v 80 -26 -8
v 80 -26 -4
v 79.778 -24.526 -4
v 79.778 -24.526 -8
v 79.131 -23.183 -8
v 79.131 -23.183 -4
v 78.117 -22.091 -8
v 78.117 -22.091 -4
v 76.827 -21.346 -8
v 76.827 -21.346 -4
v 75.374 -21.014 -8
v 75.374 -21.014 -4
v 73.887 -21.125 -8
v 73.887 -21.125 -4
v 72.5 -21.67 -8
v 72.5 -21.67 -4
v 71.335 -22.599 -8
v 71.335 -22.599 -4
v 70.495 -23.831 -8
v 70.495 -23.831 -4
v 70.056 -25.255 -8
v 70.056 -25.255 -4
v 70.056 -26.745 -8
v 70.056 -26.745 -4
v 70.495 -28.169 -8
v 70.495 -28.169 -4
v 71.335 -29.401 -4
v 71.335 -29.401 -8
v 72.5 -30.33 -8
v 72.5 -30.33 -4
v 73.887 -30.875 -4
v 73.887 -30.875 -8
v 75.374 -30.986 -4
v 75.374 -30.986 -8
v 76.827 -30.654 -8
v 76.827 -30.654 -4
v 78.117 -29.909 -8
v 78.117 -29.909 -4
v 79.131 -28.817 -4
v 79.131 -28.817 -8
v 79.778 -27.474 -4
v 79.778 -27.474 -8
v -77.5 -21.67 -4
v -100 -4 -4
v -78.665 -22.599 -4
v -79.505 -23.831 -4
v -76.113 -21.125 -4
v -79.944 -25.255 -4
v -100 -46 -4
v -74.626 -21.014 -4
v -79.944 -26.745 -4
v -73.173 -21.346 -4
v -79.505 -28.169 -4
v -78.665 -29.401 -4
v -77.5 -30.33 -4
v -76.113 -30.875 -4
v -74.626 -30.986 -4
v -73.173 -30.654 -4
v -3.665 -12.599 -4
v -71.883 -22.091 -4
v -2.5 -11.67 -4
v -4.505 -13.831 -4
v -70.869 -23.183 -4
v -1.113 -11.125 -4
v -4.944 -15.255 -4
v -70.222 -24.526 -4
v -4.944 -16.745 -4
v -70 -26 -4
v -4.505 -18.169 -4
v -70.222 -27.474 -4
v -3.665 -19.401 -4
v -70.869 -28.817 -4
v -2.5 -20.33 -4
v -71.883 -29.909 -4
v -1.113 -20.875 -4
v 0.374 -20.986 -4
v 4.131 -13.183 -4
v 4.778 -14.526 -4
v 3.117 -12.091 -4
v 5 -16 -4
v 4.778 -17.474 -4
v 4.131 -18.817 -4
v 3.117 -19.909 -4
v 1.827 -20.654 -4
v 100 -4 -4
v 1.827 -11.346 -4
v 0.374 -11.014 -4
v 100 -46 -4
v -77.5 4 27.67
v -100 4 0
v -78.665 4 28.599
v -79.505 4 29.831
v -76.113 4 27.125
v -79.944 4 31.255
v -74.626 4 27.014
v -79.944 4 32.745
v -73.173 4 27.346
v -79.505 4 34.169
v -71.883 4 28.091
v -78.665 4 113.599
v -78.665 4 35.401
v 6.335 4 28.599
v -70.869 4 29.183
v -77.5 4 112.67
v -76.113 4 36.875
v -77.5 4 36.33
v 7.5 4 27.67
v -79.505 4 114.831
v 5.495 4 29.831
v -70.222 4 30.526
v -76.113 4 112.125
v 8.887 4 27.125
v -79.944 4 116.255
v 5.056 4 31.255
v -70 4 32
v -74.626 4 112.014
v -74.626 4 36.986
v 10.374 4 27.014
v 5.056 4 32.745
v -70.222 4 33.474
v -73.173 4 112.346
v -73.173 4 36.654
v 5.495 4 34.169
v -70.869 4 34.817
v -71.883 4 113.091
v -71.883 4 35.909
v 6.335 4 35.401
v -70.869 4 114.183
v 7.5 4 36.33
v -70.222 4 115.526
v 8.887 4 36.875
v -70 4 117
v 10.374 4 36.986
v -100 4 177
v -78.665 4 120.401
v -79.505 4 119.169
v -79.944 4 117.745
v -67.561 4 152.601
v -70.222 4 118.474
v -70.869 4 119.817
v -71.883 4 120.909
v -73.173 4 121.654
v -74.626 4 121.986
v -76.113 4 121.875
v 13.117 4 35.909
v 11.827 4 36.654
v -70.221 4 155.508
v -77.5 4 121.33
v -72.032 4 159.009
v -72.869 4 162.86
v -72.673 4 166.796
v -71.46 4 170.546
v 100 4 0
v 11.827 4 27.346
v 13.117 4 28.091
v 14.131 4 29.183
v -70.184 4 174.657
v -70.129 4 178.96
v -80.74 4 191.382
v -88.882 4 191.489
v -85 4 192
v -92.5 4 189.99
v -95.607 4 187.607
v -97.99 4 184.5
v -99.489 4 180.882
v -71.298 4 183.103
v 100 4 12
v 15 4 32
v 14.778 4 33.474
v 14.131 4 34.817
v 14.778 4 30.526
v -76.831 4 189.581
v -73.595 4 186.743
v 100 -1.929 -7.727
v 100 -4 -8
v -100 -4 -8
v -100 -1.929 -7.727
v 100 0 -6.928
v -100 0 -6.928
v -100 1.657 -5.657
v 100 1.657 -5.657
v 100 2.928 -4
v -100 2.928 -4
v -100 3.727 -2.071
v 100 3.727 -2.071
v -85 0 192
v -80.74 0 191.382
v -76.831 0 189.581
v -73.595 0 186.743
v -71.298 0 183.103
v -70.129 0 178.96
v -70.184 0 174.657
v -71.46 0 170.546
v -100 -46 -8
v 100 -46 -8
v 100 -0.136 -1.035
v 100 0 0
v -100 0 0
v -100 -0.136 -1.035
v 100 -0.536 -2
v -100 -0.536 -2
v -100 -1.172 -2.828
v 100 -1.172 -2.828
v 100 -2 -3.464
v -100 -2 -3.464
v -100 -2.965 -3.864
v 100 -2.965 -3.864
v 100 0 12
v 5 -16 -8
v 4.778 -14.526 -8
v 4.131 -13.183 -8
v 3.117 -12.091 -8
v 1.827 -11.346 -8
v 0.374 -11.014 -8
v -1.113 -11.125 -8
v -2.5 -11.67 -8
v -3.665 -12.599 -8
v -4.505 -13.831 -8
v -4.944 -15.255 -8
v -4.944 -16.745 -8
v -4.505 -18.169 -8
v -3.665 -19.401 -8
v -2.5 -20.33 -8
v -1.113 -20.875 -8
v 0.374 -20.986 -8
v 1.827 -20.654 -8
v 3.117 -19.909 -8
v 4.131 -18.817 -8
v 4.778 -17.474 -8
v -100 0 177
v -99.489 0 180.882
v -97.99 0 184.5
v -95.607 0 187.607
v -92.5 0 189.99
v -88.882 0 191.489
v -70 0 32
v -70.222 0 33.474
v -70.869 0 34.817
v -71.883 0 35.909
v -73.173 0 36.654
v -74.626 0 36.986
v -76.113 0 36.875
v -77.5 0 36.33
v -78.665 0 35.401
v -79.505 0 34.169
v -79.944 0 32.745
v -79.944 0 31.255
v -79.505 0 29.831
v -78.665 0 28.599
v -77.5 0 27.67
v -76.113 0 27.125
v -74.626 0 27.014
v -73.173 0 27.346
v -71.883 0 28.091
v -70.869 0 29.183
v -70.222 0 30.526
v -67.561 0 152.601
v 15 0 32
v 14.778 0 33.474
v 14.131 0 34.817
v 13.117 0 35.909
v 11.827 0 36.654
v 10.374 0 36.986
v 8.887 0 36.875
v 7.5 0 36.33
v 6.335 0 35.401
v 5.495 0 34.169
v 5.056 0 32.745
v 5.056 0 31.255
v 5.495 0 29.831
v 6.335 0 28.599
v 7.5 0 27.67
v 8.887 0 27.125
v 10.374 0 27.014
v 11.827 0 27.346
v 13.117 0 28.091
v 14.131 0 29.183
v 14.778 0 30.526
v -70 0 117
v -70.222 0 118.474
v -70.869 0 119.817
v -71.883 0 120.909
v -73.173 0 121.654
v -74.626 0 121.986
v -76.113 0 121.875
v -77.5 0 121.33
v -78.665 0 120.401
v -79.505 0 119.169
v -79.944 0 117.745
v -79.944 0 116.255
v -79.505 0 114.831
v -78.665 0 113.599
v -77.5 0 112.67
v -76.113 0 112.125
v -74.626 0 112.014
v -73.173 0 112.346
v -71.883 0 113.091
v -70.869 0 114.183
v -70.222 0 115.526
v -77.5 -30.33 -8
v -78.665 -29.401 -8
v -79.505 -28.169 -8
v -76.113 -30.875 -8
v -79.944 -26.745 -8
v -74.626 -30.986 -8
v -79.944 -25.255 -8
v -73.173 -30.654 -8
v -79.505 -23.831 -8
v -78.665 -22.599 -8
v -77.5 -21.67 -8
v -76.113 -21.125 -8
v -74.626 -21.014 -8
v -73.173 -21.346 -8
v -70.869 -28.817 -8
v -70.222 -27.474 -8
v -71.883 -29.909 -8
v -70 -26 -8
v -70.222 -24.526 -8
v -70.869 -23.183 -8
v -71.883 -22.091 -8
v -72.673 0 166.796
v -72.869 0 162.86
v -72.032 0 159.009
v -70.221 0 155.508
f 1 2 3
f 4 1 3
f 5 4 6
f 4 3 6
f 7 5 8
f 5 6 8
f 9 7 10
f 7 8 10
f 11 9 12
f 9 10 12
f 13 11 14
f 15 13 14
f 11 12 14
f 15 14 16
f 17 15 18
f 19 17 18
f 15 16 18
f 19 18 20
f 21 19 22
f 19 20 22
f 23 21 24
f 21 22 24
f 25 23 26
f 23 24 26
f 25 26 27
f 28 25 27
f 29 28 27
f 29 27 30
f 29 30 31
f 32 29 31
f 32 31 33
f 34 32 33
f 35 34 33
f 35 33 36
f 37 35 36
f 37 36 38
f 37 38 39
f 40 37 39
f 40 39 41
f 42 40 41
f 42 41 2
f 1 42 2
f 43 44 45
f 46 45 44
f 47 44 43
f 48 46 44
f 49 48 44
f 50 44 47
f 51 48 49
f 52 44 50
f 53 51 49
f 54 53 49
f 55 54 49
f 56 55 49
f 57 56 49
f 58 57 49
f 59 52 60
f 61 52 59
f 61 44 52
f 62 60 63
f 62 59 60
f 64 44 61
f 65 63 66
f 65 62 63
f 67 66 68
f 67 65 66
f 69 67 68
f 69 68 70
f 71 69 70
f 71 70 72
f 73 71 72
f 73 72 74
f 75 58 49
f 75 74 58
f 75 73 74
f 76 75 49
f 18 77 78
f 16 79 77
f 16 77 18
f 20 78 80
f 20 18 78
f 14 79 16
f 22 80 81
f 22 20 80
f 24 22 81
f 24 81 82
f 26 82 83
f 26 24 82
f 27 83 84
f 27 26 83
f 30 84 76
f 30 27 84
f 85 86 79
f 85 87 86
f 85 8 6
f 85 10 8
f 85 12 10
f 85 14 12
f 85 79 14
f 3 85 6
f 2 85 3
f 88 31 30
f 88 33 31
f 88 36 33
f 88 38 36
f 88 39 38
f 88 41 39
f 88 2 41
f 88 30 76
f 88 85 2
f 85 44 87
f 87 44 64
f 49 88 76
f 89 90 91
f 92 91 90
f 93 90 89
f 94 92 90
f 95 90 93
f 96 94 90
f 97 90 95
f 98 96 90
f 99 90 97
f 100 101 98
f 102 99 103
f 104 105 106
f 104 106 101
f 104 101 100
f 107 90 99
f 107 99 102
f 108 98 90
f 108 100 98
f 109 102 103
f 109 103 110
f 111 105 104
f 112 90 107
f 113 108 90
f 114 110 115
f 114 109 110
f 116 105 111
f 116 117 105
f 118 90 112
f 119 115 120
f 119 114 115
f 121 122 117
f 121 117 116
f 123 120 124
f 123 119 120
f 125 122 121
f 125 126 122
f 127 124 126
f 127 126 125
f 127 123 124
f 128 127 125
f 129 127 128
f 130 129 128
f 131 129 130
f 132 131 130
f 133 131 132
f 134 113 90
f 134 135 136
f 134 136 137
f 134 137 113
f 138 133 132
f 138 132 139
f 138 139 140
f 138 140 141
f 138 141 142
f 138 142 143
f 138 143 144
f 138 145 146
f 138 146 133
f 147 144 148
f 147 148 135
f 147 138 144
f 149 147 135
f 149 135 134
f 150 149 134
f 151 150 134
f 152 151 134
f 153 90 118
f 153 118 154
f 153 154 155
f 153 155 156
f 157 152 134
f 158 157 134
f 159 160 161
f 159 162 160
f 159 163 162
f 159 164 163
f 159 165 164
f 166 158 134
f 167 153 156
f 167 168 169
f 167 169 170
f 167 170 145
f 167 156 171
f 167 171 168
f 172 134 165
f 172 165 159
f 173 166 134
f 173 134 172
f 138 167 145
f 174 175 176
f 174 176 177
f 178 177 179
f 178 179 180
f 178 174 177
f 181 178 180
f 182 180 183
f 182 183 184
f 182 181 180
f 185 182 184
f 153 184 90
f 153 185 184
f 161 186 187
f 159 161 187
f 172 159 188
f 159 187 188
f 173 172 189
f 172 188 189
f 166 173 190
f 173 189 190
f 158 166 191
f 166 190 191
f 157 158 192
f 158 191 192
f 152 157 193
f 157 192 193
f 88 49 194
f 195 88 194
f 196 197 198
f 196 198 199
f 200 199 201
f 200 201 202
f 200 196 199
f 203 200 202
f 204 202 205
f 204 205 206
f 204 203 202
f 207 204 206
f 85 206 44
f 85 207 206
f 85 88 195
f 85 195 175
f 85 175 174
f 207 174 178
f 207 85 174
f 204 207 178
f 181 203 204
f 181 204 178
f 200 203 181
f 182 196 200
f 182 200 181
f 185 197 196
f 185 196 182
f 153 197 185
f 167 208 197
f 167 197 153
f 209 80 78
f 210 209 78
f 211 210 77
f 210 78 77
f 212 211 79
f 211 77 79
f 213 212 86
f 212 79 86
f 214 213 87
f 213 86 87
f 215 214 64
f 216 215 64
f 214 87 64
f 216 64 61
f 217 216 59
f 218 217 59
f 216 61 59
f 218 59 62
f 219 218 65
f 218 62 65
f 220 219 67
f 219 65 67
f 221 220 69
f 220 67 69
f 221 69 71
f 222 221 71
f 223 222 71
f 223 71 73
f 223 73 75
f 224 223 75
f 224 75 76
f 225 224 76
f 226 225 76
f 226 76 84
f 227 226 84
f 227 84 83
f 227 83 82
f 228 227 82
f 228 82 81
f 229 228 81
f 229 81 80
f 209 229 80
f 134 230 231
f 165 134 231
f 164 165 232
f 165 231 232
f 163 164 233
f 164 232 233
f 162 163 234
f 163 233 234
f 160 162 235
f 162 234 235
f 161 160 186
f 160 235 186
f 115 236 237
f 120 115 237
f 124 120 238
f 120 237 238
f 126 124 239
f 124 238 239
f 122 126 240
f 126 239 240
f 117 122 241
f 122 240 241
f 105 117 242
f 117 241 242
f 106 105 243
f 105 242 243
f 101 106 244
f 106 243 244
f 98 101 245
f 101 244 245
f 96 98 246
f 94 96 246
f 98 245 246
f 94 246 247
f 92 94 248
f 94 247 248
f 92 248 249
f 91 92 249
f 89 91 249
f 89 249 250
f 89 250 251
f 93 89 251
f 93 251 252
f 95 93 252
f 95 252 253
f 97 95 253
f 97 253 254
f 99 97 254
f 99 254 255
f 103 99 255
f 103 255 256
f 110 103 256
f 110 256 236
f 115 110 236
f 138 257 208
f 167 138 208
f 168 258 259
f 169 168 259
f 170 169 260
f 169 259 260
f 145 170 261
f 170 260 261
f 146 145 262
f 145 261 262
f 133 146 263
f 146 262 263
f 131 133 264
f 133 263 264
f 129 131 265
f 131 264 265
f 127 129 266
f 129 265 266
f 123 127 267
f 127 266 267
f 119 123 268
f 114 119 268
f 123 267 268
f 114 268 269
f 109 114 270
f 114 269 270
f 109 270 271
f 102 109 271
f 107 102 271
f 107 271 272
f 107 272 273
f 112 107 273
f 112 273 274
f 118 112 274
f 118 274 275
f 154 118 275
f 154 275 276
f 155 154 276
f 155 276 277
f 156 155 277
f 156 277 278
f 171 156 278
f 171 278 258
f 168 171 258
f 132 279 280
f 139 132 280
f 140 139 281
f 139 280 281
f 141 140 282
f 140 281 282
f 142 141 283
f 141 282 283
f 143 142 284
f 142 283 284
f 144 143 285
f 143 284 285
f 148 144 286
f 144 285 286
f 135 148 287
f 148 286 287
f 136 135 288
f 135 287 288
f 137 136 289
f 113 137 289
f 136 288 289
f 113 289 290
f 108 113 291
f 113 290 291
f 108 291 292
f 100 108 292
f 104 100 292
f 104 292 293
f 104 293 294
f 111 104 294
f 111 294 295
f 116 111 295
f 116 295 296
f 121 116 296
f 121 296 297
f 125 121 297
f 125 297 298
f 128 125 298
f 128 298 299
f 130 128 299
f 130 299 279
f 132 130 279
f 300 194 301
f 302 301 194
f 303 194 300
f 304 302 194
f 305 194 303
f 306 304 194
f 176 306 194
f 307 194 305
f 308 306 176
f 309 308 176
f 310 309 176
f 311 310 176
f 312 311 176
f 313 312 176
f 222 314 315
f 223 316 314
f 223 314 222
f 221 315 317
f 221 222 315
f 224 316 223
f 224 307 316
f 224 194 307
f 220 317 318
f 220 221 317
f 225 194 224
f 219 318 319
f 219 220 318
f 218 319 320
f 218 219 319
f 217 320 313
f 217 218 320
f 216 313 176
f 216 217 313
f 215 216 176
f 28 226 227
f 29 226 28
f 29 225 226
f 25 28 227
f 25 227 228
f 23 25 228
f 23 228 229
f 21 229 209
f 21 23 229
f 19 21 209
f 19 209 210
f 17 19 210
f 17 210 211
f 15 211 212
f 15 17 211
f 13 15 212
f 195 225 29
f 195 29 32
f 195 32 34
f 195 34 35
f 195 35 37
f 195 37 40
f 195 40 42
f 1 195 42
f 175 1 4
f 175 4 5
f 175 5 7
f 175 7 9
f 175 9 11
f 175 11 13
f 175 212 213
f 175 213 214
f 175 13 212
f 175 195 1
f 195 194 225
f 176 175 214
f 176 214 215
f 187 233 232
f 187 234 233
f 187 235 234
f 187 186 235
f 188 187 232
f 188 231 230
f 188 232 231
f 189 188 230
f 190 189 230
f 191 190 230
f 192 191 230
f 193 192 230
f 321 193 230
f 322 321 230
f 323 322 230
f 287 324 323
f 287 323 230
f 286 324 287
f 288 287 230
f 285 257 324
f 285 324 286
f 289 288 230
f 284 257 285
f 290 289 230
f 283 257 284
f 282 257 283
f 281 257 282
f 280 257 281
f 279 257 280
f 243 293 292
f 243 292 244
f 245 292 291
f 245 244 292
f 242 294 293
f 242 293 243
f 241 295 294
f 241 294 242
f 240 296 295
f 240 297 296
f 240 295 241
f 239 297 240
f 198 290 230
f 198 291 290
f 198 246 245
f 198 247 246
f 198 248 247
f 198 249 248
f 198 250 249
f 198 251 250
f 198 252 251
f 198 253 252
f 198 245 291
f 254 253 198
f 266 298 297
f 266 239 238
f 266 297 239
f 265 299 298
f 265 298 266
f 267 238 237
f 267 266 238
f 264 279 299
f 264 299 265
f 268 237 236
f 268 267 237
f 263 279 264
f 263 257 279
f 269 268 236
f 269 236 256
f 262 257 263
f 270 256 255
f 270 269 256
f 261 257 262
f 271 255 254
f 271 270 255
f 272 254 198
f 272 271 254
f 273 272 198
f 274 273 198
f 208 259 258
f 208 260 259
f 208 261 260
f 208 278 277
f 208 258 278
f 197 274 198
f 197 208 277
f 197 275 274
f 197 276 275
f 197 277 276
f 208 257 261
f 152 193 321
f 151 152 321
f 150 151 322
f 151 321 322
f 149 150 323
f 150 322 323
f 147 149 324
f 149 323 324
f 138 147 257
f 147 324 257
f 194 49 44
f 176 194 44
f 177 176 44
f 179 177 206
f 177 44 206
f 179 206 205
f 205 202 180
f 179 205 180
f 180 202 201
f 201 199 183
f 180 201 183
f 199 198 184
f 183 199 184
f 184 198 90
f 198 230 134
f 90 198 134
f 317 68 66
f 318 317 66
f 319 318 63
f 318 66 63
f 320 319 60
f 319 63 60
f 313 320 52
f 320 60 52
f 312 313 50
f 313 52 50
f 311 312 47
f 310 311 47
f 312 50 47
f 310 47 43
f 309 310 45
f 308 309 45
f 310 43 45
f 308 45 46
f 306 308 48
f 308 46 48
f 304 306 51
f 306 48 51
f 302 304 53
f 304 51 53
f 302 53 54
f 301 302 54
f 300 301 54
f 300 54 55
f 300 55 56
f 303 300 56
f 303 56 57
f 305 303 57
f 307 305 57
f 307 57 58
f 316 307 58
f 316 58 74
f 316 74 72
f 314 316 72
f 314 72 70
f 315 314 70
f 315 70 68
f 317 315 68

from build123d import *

# Parameters (mm, degrees)
F1_DEPTH = 100
F3_DEPTH = 4.001
F4_R     = 5
F5_DEPTH = 4.001
F6_R     = 5
F7_DEPTH = 4.001


# Not quite as in the source:
# - a feature names something its author has since deleted; it is built from what else it names


with BuildPart() as f1:
    # F0 (on Right) → F1 (new body, symmetric)
    with BuildSketch(Plane.YZ):
        with BuildLine():
            Line((0, 192), (0, 0))
            ThreePointArc((0, 0), (-1.1715728753, -2.8284271247), (-4, -4))
            Line((-4, -4), (-46, -4))
            Line((-46, -4), (-46, -8))
            Line((-46, -8), (-4, -8))
            ThreePointArc((-4, -8), (1.6568542495, -5.6568542495), (4, 0))
            Line((4, 0), (4, 192))
            Line((4, 192), (0, 192))
        make_face()
    extrude(amount=F1_DEPTH, both=True)

    # F2 (on face) → F3 (cut, through all)
    with BuildSketch(Plane.XZ):
        with BuildLine():
            Line((-67.5611548883, 152.6005032665), (100, 12))
            Line((100, 12), (100, 192))
            Line((100, 192), (-85, 192))
            ThreePointArc((-85, 192), (-72.3150438383, 185.0057408886), (-71.4596703715, 170.5455849566))
            ThreePointArc((-71.4596703715, 170.5455849566), (-72.5774250894, 160.9067448009), (-67.5611548883, 152.6005032665))
        make_face()
        with BuildLine():
            ThreePointArc((-100, 177), (-95.6066017178, 187.6066017178), (-85, 192))
            Line((-85, 192), (-100, 192))
            Line((-100, 192), (-100, 177))
        make_face()
    extrude(amount=-F3_DEPTH, mode=Mode.SUBTRACT)

    # F4 (on face) → F5 (cut, through all)
    with BuildSketch(Plane.XZ):
        with Locations((-75, 32)):
            Circle(F4_R)
        with Locations((10, 32)):
            Circle(F4_R)
        with Locations((-75, 117)):
            Circle(F4_R)
    extrude(amount=-F5_DEPTH, mode=Mode.SUBTRACT)

    # F6 (on face) → F7 (cut, through all)
    with BuildSketch(Plane.XY.offset(-4)):
        with Locations((-75, -26)):
            Circle(F6_R)
        with Locations((0, -16)):
            Circle(F6_R)
        with Locations((75, -26)):
            Circle(F6_R)
    extrude(amount=-F7_DEPTH, mode=Mode.SUBTRACT)


solid = f1.part
